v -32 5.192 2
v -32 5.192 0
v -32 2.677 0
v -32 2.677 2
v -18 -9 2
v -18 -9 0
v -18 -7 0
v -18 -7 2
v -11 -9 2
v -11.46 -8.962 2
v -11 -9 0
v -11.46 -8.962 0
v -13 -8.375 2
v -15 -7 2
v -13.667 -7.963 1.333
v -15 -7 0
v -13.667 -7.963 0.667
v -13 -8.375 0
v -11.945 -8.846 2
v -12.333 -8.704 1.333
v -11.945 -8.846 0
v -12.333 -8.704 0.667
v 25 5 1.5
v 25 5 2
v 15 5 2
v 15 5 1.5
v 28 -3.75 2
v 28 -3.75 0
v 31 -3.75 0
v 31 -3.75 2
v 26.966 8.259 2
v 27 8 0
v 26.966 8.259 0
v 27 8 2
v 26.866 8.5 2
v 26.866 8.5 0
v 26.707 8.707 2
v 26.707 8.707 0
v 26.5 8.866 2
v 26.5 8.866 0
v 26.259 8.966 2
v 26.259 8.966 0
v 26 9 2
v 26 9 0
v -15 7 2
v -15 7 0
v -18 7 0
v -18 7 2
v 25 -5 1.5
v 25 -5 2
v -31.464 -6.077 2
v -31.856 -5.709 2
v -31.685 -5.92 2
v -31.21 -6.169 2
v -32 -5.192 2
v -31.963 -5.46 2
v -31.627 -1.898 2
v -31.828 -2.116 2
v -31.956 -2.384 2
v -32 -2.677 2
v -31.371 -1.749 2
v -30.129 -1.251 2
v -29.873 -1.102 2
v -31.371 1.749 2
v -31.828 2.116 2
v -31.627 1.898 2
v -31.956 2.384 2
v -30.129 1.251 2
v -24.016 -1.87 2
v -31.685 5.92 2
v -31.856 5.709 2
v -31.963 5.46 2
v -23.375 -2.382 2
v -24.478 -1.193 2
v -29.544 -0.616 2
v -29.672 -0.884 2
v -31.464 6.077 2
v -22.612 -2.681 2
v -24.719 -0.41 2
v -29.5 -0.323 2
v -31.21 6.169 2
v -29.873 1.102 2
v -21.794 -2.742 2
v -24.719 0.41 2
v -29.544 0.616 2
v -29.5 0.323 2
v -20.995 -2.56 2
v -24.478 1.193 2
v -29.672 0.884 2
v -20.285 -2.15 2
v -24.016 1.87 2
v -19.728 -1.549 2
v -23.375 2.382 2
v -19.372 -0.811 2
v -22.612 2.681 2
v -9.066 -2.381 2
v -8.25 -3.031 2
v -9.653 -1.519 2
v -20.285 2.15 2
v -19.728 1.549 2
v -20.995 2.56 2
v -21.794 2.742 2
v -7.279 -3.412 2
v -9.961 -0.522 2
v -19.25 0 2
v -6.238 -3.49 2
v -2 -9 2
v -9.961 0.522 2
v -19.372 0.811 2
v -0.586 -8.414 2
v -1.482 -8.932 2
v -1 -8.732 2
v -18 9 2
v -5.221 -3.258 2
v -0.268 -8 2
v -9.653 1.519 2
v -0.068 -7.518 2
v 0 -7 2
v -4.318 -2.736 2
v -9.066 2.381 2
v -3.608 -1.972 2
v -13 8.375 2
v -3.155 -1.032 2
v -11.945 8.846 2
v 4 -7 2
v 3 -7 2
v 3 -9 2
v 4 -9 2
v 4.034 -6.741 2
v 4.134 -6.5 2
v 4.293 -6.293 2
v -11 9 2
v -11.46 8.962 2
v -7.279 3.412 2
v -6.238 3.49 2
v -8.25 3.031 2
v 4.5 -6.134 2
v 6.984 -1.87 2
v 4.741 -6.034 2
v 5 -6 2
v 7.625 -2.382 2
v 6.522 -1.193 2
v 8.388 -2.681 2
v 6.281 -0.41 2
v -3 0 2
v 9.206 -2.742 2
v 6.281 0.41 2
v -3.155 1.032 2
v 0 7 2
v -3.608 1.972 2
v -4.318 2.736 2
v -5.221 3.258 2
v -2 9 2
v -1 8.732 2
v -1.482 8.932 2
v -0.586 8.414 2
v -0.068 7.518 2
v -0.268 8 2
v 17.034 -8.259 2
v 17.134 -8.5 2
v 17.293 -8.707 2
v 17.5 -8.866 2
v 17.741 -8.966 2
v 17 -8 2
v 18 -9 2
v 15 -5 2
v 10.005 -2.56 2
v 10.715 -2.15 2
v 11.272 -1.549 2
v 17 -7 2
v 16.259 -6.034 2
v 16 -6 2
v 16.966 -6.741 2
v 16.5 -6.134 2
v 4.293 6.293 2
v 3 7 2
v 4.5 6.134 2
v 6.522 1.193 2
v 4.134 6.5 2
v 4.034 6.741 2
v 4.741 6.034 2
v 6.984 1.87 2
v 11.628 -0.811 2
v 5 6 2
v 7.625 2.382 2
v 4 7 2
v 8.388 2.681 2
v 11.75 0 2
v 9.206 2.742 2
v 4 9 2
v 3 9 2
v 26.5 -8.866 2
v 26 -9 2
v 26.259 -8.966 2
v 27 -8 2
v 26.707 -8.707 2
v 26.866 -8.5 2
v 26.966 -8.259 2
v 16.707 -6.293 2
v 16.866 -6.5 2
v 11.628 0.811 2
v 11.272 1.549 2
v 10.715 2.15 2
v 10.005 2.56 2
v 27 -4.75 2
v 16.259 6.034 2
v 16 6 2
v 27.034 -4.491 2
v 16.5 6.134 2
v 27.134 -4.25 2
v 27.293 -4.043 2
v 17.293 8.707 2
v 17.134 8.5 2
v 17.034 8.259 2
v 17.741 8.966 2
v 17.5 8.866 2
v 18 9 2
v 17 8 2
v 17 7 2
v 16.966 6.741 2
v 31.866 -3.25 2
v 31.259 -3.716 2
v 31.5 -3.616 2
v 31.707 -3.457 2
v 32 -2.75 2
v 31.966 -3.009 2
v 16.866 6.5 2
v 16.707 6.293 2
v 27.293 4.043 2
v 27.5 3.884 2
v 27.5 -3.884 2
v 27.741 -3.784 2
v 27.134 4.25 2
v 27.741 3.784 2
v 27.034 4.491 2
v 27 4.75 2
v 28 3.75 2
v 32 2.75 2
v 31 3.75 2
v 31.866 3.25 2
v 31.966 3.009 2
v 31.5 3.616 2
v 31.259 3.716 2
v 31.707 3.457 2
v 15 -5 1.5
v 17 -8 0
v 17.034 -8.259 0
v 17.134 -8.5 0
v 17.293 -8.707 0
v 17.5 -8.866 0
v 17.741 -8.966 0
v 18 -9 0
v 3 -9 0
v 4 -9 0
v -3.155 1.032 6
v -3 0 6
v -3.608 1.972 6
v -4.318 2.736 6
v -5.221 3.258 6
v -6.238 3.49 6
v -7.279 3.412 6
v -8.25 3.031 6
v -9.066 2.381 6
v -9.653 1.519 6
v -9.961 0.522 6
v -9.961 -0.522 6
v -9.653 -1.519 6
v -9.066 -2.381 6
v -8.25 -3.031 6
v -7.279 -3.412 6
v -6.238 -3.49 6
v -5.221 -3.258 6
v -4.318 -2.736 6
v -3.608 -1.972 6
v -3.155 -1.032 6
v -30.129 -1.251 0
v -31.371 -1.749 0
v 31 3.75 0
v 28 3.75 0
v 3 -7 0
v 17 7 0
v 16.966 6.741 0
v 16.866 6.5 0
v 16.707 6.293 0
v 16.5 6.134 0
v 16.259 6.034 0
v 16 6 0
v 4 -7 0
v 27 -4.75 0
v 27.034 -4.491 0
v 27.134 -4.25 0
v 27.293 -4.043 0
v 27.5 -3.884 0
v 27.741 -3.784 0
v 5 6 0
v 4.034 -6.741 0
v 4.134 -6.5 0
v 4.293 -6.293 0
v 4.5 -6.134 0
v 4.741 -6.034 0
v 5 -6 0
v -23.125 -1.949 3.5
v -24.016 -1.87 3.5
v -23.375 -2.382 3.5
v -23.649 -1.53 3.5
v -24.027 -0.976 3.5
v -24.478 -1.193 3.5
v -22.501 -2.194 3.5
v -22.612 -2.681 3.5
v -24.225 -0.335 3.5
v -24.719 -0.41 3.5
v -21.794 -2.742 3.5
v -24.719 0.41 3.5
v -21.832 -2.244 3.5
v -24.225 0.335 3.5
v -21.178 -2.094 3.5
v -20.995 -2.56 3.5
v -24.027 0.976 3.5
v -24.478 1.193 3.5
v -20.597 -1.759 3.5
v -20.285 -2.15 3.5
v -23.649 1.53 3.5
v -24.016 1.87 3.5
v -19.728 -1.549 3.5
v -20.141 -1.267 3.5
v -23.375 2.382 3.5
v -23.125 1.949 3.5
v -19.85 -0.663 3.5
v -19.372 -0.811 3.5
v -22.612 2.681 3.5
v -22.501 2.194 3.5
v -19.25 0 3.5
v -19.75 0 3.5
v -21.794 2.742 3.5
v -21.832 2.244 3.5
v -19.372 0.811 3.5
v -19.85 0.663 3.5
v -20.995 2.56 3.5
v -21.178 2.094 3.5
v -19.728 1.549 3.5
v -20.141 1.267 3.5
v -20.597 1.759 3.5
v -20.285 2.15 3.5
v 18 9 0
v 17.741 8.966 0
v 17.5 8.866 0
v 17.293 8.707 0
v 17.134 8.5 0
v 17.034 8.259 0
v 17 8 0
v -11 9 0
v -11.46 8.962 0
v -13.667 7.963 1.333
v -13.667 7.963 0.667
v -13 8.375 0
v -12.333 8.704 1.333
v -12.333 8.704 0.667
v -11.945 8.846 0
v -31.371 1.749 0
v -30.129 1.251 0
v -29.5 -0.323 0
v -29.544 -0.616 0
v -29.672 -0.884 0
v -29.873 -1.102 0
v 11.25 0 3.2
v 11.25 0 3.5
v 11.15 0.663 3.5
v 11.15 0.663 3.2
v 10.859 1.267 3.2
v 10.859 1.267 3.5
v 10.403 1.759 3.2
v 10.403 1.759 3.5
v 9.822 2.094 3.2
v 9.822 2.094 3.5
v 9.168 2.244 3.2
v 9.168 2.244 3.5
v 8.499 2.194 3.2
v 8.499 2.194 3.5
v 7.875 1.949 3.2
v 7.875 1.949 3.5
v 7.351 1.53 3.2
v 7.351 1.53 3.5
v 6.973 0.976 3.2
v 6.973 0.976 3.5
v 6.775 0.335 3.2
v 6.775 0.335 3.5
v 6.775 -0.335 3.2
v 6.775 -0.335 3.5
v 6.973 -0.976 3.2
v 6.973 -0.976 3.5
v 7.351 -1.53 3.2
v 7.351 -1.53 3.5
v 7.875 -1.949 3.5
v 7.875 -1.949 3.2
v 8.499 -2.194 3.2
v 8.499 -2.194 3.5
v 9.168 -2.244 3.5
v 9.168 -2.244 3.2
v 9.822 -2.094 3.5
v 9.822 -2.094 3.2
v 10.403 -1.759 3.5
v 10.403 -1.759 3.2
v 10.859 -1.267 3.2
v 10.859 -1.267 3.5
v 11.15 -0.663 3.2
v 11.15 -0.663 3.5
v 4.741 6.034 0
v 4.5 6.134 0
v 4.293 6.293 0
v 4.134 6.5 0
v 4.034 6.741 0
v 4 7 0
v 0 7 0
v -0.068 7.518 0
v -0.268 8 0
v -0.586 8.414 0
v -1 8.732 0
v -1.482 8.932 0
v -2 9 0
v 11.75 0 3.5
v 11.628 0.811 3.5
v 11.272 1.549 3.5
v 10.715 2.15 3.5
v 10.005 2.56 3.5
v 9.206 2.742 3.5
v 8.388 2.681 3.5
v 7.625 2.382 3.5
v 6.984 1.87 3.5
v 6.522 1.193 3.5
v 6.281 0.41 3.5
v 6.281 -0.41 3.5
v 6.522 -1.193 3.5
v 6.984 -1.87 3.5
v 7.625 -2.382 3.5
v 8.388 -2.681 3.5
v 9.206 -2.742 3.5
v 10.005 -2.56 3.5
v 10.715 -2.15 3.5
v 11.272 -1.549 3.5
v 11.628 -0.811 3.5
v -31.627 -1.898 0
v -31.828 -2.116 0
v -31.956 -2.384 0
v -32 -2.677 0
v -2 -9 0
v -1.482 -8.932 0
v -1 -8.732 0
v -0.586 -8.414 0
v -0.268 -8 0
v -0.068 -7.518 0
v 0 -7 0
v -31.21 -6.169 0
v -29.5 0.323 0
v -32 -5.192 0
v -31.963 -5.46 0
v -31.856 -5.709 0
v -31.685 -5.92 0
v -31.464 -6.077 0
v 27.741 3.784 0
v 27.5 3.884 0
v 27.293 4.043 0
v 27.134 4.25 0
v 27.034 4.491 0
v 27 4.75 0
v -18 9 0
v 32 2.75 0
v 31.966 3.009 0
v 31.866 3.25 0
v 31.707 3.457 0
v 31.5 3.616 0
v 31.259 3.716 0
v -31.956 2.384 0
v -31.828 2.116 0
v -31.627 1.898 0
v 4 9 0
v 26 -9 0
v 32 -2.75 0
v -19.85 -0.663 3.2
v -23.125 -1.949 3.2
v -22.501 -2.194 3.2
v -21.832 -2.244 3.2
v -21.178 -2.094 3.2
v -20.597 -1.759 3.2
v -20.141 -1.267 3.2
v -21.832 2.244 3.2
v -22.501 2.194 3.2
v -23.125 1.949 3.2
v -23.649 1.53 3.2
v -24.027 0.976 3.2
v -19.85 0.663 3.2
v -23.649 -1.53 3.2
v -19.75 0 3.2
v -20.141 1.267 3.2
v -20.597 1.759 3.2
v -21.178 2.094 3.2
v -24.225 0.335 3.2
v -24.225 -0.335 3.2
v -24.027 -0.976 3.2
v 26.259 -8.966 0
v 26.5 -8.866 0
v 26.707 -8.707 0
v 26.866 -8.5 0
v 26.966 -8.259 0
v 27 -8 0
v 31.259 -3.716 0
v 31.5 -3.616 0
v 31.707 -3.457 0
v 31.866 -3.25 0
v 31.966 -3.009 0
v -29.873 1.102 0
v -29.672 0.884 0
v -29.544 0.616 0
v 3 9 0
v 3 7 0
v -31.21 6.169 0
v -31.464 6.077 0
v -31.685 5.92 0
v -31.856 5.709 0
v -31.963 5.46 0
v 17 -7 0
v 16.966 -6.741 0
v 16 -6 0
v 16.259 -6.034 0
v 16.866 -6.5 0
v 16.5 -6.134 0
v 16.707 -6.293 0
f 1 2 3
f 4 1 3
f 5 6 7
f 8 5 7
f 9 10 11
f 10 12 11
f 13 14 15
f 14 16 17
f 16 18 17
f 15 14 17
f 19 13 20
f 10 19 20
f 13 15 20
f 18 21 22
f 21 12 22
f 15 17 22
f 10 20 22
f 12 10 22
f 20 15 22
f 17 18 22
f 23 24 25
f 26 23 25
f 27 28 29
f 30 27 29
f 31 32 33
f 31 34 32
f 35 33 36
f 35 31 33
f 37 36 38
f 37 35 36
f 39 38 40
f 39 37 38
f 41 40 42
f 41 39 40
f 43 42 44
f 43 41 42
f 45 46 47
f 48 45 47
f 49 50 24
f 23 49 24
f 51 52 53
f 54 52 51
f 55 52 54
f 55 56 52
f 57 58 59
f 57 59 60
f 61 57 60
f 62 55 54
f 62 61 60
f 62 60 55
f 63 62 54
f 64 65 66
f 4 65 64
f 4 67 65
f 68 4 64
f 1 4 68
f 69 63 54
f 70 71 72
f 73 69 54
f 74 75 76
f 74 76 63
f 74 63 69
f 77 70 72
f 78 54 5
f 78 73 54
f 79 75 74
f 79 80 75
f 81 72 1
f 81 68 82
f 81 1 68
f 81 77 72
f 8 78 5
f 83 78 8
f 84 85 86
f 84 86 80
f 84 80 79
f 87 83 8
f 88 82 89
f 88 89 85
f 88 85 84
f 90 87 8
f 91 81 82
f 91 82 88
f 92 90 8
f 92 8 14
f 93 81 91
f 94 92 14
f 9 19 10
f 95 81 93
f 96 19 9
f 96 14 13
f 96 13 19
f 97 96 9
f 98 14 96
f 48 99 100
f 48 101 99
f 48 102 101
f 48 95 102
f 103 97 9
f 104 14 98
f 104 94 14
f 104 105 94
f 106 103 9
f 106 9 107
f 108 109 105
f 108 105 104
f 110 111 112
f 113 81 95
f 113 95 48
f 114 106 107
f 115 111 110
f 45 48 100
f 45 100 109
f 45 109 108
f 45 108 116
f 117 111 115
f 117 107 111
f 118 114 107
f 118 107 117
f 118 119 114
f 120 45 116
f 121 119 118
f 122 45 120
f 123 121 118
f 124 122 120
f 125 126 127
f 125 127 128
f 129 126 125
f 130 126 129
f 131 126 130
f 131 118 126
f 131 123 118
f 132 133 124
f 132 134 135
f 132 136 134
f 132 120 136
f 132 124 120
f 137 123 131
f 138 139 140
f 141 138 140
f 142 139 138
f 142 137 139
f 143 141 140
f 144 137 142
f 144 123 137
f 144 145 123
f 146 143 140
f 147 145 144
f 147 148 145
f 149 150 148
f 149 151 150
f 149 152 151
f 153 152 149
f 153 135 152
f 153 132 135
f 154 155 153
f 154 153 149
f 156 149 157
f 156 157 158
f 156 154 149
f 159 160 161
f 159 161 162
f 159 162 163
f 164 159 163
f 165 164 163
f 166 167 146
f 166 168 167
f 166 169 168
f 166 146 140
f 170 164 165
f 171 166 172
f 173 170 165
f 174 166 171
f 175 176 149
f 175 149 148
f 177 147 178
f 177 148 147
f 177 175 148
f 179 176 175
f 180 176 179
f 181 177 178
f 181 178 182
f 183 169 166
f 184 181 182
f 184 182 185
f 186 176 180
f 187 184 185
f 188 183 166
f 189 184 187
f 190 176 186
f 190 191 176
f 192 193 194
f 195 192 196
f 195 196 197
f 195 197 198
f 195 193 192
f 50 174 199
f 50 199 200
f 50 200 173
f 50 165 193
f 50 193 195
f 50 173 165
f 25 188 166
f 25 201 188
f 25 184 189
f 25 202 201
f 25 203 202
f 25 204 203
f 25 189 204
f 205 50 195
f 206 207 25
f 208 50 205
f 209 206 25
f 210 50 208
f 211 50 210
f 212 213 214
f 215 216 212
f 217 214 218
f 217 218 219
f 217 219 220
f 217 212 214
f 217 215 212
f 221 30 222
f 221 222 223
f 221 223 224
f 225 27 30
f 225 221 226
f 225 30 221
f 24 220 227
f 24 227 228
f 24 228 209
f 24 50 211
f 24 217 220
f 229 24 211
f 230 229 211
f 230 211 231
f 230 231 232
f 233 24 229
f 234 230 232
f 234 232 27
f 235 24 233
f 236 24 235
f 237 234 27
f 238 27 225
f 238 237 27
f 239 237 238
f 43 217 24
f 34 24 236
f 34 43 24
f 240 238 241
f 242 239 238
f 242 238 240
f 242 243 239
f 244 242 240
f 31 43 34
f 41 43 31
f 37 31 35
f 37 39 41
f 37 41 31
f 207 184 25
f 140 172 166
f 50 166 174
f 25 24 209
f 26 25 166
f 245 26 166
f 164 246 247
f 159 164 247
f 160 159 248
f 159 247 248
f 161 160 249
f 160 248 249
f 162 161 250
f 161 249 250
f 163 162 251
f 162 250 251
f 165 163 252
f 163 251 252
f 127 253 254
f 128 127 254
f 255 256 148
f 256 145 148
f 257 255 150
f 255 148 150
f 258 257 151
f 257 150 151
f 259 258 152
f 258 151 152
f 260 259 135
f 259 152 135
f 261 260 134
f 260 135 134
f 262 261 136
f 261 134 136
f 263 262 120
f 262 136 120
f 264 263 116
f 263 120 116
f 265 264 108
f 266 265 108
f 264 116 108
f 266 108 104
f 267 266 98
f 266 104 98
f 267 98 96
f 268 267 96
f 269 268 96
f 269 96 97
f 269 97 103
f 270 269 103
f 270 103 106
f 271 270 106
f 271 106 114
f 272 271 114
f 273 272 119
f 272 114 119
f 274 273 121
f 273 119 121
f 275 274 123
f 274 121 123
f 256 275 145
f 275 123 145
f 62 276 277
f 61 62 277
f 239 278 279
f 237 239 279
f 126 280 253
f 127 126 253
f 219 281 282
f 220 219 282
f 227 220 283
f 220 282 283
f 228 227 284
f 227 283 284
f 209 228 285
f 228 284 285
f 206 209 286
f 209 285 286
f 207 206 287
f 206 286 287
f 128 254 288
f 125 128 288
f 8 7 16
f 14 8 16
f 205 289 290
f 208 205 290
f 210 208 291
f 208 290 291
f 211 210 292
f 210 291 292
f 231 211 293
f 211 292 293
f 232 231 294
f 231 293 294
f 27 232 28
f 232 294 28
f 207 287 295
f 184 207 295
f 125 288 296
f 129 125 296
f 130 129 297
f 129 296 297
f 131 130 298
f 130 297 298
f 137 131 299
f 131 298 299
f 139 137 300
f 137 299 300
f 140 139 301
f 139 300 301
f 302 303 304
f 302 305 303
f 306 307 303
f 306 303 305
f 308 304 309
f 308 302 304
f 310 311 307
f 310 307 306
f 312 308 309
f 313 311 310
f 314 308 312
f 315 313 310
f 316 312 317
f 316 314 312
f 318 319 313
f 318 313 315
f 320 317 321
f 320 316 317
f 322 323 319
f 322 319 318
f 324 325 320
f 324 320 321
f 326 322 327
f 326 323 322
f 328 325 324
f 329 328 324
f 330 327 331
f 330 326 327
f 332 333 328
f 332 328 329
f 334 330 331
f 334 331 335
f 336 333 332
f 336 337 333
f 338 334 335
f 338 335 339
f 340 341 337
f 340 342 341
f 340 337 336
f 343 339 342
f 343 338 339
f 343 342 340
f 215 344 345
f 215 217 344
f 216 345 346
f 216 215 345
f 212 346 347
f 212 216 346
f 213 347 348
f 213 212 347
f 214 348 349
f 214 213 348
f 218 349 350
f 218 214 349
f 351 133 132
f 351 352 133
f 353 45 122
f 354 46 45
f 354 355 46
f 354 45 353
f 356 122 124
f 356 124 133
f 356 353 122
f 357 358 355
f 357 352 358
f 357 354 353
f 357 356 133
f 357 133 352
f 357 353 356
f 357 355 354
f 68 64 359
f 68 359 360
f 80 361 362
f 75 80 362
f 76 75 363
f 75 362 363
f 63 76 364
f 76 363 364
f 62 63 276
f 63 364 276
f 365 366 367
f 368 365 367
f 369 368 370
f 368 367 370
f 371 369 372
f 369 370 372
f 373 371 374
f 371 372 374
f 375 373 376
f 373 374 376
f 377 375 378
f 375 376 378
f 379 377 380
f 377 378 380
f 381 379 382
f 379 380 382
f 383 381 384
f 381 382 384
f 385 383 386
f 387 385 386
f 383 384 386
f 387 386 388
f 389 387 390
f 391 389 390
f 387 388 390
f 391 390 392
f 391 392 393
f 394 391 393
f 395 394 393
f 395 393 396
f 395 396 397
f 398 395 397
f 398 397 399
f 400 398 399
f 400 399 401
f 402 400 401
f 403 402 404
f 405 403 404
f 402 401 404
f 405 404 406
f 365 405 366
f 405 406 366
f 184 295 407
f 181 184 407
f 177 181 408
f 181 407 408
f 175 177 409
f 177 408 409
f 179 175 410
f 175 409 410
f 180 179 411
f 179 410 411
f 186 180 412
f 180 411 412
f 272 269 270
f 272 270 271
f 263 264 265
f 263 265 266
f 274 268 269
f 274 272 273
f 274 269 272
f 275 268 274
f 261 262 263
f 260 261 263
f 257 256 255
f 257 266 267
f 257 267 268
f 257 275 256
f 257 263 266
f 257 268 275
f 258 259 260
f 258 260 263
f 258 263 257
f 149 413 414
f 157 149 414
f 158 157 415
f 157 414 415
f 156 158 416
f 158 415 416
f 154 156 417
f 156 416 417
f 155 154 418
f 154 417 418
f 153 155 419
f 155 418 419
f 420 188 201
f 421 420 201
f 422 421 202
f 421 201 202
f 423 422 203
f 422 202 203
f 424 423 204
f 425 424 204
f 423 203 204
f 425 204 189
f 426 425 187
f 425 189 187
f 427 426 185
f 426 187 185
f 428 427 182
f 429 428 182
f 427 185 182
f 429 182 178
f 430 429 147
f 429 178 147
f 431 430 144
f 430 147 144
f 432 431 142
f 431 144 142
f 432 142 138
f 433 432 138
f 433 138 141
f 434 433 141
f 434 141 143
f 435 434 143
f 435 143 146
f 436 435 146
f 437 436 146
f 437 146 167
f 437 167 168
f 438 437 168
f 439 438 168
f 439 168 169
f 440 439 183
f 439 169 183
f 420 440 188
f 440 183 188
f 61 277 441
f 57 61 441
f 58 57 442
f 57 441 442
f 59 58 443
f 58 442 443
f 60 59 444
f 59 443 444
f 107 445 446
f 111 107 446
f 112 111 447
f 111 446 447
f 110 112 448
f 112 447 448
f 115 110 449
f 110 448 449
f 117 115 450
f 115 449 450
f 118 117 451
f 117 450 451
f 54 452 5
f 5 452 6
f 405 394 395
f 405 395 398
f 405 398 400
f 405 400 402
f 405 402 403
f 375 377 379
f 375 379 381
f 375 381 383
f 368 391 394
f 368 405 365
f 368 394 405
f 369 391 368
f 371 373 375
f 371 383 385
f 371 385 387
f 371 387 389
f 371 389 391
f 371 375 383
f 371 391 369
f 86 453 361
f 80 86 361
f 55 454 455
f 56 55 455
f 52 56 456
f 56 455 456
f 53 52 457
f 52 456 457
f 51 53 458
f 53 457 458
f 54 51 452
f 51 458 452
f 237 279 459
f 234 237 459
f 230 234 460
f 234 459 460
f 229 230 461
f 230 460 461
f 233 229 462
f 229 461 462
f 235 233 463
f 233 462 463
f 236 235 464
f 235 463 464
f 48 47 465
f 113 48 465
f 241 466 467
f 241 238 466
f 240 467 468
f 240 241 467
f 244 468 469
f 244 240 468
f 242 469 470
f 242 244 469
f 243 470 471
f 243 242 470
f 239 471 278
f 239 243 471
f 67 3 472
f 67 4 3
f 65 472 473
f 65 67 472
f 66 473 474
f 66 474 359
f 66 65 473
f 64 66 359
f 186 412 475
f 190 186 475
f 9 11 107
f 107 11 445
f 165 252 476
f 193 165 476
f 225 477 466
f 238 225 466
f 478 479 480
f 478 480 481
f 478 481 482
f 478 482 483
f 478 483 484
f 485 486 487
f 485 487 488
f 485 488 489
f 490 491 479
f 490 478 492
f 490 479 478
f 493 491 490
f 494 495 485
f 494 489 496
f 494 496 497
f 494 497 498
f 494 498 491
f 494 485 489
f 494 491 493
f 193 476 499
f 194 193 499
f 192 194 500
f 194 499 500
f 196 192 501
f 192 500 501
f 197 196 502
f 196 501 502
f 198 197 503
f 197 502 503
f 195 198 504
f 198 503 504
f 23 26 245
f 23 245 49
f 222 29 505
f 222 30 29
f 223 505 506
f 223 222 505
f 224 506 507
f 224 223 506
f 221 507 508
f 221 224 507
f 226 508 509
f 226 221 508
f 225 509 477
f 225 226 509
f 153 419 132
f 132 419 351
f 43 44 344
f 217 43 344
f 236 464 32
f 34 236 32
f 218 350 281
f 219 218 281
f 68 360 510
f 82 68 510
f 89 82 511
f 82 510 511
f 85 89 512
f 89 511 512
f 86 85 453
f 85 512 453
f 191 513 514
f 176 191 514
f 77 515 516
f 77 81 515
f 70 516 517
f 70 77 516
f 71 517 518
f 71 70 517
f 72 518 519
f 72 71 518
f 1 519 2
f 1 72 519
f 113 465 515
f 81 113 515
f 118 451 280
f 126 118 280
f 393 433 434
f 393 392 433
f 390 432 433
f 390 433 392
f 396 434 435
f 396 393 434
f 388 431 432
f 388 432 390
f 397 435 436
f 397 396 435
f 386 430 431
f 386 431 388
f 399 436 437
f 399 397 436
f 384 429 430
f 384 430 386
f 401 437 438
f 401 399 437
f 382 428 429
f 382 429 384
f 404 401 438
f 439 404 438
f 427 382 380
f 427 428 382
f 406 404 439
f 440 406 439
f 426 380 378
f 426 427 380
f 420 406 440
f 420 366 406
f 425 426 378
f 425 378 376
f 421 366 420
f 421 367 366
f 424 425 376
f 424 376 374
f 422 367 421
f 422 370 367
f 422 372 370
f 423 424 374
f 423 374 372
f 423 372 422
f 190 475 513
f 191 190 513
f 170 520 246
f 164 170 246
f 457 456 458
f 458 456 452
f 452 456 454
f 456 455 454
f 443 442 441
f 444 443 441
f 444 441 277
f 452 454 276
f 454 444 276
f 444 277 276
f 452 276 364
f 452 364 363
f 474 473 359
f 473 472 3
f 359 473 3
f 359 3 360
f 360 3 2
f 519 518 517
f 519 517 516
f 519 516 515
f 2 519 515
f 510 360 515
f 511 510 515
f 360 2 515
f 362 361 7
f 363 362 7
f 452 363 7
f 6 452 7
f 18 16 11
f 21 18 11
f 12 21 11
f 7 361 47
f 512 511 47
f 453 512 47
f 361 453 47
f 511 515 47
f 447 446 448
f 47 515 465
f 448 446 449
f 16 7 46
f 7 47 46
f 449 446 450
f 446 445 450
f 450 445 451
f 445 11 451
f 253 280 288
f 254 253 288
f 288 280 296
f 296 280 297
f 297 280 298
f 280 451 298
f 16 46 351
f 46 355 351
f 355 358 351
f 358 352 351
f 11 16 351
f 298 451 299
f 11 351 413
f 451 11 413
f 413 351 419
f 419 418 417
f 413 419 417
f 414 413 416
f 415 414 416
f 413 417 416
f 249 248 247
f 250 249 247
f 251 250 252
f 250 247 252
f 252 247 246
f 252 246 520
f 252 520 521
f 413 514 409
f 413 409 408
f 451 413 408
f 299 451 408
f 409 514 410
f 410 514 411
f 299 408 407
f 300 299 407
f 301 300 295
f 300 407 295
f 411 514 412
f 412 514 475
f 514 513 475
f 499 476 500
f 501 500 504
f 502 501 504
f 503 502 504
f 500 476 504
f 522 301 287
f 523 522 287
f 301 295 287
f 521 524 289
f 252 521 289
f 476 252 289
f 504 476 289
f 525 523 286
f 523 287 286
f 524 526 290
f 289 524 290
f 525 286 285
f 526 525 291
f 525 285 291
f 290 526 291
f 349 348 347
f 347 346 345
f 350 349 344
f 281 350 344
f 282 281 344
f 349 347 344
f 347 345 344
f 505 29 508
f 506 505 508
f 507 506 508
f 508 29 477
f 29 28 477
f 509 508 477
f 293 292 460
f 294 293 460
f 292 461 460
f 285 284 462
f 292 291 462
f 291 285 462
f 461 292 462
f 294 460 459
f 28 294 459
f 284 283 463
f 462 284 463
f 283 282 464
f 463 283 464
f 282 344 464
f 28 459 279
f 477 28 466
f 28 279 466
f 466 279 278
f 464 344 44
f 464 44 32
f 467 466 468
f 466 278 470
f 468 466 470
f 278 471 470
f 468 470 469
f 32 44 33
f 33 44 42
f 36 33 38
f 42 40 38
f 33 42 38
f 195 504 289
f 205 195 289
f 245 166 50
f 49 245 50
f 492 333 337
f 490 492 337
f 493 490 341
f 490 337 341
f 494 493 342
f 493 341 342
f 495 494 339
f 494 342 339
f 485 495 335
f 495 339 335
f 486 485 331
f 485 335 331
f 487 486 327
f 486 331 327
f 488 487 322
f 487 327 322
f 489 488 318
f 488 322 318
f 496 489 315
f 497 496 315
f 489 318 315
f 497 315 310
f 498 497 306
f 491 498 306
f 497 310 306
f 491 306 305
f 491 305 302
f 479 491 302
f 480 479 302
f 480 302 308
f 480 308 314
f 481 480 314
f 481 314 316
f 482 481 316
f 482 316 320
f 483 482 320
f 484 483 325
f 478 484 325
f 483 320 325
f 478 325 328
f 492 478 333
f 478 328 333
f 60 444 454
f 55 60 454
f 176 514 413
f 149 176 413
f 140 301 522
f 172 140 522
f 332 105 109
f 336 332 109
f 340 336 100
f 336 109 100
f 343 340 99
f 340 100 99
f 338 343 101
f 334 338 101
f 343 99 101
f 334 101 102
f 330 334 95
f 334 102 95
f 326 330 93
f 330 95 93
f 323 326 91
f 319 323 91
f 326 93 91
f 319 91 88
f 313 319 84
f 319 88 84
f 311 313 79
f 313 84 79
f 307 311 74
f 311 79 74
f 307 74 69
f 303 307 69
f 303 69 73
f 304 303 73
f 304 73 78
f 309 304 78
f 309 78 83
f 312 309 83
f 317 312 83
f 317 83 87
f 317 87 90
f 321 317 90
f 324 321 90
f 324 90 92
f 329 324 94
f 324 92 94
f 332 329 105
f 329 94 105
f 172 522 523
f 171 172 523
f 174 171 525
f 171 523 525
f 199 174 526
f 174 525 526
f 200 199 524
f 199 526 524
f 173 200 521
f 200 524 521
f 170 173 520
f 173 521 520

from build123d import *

# Parameters (mm, degrees)
F1_DEPTH  = 2
F2_R      = 1
F4_DEPTH  = 0.5
F5_R      = 2.75
F6_DEPTH  = 1.5
F7_R      = 2.25
F8_DEPTH  = 0.3
F9_R      = 3.5
F10_DEPTH = 2.5


with BuildPart() as f1:
    # F0 (on Top) → F1 (new body)
    with BuildSketch(Plane.XY):
        with BuildLine():
            Line((27, 4.75), (27, 9))
            Line((27, 9), (17, 9))
            Line((17, 9), (17, 7))
            ThreePointArc((17, 7), (16.707107, 6.292893), (16, 6))
            Line((16, 6), (5, 6))
            ThreePointArc((5, 6), (4.292893, 6.292893), (4, 7))
            Line((4, 7), (4, 9))
            Line((4, 9), (3, 9))
            Line((3, 9), (3, 7))
            Line((3, 7), (0, 7))
            ThreePointArc((0, 7), (-0.585786, 8.414214), (-2, 9))
            Line((-2, 9), (-11, 9))
            add(Edge.make_bspline(
                [(-15, 7), (-13.666667, 8), (-12.333333, 9), (-11, 9)],
                knots=[0, 0, 0, 0, 4.472136, 4.472136, 4.472136, 4.472136], degree=3))
            Line((-15, 7), (-18, 7))
            Line((-18, 7), (-18, 9))
            Line((-18, 9), (-32, 6))
            Line((-32, 6), (-32, 2))
            Line((-32, 2), (-30.128609, 1.251444))
            ThreePointArc((-30.128609, 1.251444), (-29.671933, 0.883596), (-29.5, 0.322967))
            Line((-29.5, 0.322967), (-29.5, 0))
            Line((-29.5, 0), (-29.5, -0.322967))
            ThreePointArc((-29.5, -0.322967), (-29.671933, -0.883596), (-30.128609, -1.251444))
            Line((-30.128609, -1.251444), (-31.371391, -1.748556))
            ThreePointArc((-31.371391, -1.748556), (-31.828067, -2.116404), (-32, -2.677033))
            Line((-32, -2.677033), (-32, -5.191584))
            ThreePointArc((-32, -5.191584), (-31.777666, -5.820262), (-31.209529, -6.169387))
            Line((-31.209529, -6.169387), (-18, -9))
            Line((-18, -9), (-18, -7))
            Line((-18, -7), (-15, -7))
            add(Edge.make_bspline(
                [(-15, -7), (-13.666667, -8), (-12.333333, -9), (-11, -9)],
                knots=[0, 0, 0, 0, 4.472136, 4.472136, 4.472136, 4.472136], degree=3))
            Line((-11, -9), (-2, -9))
            ThreePointArc((-2, -9), (-0.585786, -8.414214), (0, -7))
            Line((0, -7), (3, -7))
            Line((3, -7), (3, -9))
            Line((3, -9), (4, -9))
            Line((4, -9), (4, -7))
            ThreePointArc((4, -7), (4.292893, -6.292893), (5, -6))
            Line((5, -6), (16, -6))
            ThreePointArc((16, -6), (16.707107, -6.292893), (17, -7))
            Line((17, -7), (17, -8))
            ThreePointArc((17, -8), (17.292893, -8.707107), (18, -9))
            Line((18, -9), (26, -9))
            ThreePointArc((26, -9), (26.707107, -8.707107), (27, -8))
            Line((27, -8), (27, -4.75))
            ThreePointArc((27, -4.75), (27.292893, -4.042893), (28, -3.75))
            Line((28, -3.75), (32, -3.75))
            Line((32, -3.75), (32, 0))
            Line((32, 0), (32, 3.75))
            Line((32, 3.75), (28, 3.75))
            ThreePointArc((28, 3.75), (27.292893, 4.042893), (27, 4.75))
        make_face()
    extrude(amount=F1_DEPTH)

    # F2
    f2_edges = [f1.edges().sort_by_distance(p)[0] for p in [
        (-32, 2, 1),
        (-32, 6, 1),
        (27, 9, 1),
        (17, 9, 1),
        (32, -3.75, 1),
        (32, 3.75, 1),
    ]]
    fillet(f2_edges, radius=F2_R)

    # F3 (on face) → F4 (cut)
    with BuildSketch(Plane.XY.offset(2)):
        Polygon((25, -5), (25, 0), (25, 5), (15, 5), (15, -5), align=None)
    extrude(amount=-F4_DEPTH, mode=Mode.SUBTRACT)

    # F5 (on face) → F6 (join)
    with BuildSketch(Plane.XY.offset(2)):
        with BuildLine():
            ThreePointArc((6.25, 0), (9, -2.75), (11.75, 0))
            ThreePointArc((11.75, 0), (9, 2.75), (6.25, 0))
        make_face()
        with Locations((-22, 0)):
            Circle(F5_R)
        with BuildLine():
            ThreePointArc((-10, 0), (-6.5, -3.5), (-3, 0))
            ThreePointArc((-3, 0), (-6.5, 3.5), (-10, 0))
        make_face()
    extrude(amount=F6_DEPTH)

    # F7 (on face) → F8 (cut)
    with BuildSketch(Plane.XY.offset(3.5)):
        with Locations((9, 0)):
            Circle(F7_R)
        with Locations((-22, 0)):
            Circle(F7_R)
    extrude(amount=-F8_DEPTH, mode=Mode.SUBTRACT)

    # F9 (on face) → F10 (join)
    with BuildSketch(Plane.XY.offset(3.5)):
        with Locations((-6.5, 0)):
            Circle(F9_R)
    extrude(amount=F10_DEPTH)


solid = f1.part
